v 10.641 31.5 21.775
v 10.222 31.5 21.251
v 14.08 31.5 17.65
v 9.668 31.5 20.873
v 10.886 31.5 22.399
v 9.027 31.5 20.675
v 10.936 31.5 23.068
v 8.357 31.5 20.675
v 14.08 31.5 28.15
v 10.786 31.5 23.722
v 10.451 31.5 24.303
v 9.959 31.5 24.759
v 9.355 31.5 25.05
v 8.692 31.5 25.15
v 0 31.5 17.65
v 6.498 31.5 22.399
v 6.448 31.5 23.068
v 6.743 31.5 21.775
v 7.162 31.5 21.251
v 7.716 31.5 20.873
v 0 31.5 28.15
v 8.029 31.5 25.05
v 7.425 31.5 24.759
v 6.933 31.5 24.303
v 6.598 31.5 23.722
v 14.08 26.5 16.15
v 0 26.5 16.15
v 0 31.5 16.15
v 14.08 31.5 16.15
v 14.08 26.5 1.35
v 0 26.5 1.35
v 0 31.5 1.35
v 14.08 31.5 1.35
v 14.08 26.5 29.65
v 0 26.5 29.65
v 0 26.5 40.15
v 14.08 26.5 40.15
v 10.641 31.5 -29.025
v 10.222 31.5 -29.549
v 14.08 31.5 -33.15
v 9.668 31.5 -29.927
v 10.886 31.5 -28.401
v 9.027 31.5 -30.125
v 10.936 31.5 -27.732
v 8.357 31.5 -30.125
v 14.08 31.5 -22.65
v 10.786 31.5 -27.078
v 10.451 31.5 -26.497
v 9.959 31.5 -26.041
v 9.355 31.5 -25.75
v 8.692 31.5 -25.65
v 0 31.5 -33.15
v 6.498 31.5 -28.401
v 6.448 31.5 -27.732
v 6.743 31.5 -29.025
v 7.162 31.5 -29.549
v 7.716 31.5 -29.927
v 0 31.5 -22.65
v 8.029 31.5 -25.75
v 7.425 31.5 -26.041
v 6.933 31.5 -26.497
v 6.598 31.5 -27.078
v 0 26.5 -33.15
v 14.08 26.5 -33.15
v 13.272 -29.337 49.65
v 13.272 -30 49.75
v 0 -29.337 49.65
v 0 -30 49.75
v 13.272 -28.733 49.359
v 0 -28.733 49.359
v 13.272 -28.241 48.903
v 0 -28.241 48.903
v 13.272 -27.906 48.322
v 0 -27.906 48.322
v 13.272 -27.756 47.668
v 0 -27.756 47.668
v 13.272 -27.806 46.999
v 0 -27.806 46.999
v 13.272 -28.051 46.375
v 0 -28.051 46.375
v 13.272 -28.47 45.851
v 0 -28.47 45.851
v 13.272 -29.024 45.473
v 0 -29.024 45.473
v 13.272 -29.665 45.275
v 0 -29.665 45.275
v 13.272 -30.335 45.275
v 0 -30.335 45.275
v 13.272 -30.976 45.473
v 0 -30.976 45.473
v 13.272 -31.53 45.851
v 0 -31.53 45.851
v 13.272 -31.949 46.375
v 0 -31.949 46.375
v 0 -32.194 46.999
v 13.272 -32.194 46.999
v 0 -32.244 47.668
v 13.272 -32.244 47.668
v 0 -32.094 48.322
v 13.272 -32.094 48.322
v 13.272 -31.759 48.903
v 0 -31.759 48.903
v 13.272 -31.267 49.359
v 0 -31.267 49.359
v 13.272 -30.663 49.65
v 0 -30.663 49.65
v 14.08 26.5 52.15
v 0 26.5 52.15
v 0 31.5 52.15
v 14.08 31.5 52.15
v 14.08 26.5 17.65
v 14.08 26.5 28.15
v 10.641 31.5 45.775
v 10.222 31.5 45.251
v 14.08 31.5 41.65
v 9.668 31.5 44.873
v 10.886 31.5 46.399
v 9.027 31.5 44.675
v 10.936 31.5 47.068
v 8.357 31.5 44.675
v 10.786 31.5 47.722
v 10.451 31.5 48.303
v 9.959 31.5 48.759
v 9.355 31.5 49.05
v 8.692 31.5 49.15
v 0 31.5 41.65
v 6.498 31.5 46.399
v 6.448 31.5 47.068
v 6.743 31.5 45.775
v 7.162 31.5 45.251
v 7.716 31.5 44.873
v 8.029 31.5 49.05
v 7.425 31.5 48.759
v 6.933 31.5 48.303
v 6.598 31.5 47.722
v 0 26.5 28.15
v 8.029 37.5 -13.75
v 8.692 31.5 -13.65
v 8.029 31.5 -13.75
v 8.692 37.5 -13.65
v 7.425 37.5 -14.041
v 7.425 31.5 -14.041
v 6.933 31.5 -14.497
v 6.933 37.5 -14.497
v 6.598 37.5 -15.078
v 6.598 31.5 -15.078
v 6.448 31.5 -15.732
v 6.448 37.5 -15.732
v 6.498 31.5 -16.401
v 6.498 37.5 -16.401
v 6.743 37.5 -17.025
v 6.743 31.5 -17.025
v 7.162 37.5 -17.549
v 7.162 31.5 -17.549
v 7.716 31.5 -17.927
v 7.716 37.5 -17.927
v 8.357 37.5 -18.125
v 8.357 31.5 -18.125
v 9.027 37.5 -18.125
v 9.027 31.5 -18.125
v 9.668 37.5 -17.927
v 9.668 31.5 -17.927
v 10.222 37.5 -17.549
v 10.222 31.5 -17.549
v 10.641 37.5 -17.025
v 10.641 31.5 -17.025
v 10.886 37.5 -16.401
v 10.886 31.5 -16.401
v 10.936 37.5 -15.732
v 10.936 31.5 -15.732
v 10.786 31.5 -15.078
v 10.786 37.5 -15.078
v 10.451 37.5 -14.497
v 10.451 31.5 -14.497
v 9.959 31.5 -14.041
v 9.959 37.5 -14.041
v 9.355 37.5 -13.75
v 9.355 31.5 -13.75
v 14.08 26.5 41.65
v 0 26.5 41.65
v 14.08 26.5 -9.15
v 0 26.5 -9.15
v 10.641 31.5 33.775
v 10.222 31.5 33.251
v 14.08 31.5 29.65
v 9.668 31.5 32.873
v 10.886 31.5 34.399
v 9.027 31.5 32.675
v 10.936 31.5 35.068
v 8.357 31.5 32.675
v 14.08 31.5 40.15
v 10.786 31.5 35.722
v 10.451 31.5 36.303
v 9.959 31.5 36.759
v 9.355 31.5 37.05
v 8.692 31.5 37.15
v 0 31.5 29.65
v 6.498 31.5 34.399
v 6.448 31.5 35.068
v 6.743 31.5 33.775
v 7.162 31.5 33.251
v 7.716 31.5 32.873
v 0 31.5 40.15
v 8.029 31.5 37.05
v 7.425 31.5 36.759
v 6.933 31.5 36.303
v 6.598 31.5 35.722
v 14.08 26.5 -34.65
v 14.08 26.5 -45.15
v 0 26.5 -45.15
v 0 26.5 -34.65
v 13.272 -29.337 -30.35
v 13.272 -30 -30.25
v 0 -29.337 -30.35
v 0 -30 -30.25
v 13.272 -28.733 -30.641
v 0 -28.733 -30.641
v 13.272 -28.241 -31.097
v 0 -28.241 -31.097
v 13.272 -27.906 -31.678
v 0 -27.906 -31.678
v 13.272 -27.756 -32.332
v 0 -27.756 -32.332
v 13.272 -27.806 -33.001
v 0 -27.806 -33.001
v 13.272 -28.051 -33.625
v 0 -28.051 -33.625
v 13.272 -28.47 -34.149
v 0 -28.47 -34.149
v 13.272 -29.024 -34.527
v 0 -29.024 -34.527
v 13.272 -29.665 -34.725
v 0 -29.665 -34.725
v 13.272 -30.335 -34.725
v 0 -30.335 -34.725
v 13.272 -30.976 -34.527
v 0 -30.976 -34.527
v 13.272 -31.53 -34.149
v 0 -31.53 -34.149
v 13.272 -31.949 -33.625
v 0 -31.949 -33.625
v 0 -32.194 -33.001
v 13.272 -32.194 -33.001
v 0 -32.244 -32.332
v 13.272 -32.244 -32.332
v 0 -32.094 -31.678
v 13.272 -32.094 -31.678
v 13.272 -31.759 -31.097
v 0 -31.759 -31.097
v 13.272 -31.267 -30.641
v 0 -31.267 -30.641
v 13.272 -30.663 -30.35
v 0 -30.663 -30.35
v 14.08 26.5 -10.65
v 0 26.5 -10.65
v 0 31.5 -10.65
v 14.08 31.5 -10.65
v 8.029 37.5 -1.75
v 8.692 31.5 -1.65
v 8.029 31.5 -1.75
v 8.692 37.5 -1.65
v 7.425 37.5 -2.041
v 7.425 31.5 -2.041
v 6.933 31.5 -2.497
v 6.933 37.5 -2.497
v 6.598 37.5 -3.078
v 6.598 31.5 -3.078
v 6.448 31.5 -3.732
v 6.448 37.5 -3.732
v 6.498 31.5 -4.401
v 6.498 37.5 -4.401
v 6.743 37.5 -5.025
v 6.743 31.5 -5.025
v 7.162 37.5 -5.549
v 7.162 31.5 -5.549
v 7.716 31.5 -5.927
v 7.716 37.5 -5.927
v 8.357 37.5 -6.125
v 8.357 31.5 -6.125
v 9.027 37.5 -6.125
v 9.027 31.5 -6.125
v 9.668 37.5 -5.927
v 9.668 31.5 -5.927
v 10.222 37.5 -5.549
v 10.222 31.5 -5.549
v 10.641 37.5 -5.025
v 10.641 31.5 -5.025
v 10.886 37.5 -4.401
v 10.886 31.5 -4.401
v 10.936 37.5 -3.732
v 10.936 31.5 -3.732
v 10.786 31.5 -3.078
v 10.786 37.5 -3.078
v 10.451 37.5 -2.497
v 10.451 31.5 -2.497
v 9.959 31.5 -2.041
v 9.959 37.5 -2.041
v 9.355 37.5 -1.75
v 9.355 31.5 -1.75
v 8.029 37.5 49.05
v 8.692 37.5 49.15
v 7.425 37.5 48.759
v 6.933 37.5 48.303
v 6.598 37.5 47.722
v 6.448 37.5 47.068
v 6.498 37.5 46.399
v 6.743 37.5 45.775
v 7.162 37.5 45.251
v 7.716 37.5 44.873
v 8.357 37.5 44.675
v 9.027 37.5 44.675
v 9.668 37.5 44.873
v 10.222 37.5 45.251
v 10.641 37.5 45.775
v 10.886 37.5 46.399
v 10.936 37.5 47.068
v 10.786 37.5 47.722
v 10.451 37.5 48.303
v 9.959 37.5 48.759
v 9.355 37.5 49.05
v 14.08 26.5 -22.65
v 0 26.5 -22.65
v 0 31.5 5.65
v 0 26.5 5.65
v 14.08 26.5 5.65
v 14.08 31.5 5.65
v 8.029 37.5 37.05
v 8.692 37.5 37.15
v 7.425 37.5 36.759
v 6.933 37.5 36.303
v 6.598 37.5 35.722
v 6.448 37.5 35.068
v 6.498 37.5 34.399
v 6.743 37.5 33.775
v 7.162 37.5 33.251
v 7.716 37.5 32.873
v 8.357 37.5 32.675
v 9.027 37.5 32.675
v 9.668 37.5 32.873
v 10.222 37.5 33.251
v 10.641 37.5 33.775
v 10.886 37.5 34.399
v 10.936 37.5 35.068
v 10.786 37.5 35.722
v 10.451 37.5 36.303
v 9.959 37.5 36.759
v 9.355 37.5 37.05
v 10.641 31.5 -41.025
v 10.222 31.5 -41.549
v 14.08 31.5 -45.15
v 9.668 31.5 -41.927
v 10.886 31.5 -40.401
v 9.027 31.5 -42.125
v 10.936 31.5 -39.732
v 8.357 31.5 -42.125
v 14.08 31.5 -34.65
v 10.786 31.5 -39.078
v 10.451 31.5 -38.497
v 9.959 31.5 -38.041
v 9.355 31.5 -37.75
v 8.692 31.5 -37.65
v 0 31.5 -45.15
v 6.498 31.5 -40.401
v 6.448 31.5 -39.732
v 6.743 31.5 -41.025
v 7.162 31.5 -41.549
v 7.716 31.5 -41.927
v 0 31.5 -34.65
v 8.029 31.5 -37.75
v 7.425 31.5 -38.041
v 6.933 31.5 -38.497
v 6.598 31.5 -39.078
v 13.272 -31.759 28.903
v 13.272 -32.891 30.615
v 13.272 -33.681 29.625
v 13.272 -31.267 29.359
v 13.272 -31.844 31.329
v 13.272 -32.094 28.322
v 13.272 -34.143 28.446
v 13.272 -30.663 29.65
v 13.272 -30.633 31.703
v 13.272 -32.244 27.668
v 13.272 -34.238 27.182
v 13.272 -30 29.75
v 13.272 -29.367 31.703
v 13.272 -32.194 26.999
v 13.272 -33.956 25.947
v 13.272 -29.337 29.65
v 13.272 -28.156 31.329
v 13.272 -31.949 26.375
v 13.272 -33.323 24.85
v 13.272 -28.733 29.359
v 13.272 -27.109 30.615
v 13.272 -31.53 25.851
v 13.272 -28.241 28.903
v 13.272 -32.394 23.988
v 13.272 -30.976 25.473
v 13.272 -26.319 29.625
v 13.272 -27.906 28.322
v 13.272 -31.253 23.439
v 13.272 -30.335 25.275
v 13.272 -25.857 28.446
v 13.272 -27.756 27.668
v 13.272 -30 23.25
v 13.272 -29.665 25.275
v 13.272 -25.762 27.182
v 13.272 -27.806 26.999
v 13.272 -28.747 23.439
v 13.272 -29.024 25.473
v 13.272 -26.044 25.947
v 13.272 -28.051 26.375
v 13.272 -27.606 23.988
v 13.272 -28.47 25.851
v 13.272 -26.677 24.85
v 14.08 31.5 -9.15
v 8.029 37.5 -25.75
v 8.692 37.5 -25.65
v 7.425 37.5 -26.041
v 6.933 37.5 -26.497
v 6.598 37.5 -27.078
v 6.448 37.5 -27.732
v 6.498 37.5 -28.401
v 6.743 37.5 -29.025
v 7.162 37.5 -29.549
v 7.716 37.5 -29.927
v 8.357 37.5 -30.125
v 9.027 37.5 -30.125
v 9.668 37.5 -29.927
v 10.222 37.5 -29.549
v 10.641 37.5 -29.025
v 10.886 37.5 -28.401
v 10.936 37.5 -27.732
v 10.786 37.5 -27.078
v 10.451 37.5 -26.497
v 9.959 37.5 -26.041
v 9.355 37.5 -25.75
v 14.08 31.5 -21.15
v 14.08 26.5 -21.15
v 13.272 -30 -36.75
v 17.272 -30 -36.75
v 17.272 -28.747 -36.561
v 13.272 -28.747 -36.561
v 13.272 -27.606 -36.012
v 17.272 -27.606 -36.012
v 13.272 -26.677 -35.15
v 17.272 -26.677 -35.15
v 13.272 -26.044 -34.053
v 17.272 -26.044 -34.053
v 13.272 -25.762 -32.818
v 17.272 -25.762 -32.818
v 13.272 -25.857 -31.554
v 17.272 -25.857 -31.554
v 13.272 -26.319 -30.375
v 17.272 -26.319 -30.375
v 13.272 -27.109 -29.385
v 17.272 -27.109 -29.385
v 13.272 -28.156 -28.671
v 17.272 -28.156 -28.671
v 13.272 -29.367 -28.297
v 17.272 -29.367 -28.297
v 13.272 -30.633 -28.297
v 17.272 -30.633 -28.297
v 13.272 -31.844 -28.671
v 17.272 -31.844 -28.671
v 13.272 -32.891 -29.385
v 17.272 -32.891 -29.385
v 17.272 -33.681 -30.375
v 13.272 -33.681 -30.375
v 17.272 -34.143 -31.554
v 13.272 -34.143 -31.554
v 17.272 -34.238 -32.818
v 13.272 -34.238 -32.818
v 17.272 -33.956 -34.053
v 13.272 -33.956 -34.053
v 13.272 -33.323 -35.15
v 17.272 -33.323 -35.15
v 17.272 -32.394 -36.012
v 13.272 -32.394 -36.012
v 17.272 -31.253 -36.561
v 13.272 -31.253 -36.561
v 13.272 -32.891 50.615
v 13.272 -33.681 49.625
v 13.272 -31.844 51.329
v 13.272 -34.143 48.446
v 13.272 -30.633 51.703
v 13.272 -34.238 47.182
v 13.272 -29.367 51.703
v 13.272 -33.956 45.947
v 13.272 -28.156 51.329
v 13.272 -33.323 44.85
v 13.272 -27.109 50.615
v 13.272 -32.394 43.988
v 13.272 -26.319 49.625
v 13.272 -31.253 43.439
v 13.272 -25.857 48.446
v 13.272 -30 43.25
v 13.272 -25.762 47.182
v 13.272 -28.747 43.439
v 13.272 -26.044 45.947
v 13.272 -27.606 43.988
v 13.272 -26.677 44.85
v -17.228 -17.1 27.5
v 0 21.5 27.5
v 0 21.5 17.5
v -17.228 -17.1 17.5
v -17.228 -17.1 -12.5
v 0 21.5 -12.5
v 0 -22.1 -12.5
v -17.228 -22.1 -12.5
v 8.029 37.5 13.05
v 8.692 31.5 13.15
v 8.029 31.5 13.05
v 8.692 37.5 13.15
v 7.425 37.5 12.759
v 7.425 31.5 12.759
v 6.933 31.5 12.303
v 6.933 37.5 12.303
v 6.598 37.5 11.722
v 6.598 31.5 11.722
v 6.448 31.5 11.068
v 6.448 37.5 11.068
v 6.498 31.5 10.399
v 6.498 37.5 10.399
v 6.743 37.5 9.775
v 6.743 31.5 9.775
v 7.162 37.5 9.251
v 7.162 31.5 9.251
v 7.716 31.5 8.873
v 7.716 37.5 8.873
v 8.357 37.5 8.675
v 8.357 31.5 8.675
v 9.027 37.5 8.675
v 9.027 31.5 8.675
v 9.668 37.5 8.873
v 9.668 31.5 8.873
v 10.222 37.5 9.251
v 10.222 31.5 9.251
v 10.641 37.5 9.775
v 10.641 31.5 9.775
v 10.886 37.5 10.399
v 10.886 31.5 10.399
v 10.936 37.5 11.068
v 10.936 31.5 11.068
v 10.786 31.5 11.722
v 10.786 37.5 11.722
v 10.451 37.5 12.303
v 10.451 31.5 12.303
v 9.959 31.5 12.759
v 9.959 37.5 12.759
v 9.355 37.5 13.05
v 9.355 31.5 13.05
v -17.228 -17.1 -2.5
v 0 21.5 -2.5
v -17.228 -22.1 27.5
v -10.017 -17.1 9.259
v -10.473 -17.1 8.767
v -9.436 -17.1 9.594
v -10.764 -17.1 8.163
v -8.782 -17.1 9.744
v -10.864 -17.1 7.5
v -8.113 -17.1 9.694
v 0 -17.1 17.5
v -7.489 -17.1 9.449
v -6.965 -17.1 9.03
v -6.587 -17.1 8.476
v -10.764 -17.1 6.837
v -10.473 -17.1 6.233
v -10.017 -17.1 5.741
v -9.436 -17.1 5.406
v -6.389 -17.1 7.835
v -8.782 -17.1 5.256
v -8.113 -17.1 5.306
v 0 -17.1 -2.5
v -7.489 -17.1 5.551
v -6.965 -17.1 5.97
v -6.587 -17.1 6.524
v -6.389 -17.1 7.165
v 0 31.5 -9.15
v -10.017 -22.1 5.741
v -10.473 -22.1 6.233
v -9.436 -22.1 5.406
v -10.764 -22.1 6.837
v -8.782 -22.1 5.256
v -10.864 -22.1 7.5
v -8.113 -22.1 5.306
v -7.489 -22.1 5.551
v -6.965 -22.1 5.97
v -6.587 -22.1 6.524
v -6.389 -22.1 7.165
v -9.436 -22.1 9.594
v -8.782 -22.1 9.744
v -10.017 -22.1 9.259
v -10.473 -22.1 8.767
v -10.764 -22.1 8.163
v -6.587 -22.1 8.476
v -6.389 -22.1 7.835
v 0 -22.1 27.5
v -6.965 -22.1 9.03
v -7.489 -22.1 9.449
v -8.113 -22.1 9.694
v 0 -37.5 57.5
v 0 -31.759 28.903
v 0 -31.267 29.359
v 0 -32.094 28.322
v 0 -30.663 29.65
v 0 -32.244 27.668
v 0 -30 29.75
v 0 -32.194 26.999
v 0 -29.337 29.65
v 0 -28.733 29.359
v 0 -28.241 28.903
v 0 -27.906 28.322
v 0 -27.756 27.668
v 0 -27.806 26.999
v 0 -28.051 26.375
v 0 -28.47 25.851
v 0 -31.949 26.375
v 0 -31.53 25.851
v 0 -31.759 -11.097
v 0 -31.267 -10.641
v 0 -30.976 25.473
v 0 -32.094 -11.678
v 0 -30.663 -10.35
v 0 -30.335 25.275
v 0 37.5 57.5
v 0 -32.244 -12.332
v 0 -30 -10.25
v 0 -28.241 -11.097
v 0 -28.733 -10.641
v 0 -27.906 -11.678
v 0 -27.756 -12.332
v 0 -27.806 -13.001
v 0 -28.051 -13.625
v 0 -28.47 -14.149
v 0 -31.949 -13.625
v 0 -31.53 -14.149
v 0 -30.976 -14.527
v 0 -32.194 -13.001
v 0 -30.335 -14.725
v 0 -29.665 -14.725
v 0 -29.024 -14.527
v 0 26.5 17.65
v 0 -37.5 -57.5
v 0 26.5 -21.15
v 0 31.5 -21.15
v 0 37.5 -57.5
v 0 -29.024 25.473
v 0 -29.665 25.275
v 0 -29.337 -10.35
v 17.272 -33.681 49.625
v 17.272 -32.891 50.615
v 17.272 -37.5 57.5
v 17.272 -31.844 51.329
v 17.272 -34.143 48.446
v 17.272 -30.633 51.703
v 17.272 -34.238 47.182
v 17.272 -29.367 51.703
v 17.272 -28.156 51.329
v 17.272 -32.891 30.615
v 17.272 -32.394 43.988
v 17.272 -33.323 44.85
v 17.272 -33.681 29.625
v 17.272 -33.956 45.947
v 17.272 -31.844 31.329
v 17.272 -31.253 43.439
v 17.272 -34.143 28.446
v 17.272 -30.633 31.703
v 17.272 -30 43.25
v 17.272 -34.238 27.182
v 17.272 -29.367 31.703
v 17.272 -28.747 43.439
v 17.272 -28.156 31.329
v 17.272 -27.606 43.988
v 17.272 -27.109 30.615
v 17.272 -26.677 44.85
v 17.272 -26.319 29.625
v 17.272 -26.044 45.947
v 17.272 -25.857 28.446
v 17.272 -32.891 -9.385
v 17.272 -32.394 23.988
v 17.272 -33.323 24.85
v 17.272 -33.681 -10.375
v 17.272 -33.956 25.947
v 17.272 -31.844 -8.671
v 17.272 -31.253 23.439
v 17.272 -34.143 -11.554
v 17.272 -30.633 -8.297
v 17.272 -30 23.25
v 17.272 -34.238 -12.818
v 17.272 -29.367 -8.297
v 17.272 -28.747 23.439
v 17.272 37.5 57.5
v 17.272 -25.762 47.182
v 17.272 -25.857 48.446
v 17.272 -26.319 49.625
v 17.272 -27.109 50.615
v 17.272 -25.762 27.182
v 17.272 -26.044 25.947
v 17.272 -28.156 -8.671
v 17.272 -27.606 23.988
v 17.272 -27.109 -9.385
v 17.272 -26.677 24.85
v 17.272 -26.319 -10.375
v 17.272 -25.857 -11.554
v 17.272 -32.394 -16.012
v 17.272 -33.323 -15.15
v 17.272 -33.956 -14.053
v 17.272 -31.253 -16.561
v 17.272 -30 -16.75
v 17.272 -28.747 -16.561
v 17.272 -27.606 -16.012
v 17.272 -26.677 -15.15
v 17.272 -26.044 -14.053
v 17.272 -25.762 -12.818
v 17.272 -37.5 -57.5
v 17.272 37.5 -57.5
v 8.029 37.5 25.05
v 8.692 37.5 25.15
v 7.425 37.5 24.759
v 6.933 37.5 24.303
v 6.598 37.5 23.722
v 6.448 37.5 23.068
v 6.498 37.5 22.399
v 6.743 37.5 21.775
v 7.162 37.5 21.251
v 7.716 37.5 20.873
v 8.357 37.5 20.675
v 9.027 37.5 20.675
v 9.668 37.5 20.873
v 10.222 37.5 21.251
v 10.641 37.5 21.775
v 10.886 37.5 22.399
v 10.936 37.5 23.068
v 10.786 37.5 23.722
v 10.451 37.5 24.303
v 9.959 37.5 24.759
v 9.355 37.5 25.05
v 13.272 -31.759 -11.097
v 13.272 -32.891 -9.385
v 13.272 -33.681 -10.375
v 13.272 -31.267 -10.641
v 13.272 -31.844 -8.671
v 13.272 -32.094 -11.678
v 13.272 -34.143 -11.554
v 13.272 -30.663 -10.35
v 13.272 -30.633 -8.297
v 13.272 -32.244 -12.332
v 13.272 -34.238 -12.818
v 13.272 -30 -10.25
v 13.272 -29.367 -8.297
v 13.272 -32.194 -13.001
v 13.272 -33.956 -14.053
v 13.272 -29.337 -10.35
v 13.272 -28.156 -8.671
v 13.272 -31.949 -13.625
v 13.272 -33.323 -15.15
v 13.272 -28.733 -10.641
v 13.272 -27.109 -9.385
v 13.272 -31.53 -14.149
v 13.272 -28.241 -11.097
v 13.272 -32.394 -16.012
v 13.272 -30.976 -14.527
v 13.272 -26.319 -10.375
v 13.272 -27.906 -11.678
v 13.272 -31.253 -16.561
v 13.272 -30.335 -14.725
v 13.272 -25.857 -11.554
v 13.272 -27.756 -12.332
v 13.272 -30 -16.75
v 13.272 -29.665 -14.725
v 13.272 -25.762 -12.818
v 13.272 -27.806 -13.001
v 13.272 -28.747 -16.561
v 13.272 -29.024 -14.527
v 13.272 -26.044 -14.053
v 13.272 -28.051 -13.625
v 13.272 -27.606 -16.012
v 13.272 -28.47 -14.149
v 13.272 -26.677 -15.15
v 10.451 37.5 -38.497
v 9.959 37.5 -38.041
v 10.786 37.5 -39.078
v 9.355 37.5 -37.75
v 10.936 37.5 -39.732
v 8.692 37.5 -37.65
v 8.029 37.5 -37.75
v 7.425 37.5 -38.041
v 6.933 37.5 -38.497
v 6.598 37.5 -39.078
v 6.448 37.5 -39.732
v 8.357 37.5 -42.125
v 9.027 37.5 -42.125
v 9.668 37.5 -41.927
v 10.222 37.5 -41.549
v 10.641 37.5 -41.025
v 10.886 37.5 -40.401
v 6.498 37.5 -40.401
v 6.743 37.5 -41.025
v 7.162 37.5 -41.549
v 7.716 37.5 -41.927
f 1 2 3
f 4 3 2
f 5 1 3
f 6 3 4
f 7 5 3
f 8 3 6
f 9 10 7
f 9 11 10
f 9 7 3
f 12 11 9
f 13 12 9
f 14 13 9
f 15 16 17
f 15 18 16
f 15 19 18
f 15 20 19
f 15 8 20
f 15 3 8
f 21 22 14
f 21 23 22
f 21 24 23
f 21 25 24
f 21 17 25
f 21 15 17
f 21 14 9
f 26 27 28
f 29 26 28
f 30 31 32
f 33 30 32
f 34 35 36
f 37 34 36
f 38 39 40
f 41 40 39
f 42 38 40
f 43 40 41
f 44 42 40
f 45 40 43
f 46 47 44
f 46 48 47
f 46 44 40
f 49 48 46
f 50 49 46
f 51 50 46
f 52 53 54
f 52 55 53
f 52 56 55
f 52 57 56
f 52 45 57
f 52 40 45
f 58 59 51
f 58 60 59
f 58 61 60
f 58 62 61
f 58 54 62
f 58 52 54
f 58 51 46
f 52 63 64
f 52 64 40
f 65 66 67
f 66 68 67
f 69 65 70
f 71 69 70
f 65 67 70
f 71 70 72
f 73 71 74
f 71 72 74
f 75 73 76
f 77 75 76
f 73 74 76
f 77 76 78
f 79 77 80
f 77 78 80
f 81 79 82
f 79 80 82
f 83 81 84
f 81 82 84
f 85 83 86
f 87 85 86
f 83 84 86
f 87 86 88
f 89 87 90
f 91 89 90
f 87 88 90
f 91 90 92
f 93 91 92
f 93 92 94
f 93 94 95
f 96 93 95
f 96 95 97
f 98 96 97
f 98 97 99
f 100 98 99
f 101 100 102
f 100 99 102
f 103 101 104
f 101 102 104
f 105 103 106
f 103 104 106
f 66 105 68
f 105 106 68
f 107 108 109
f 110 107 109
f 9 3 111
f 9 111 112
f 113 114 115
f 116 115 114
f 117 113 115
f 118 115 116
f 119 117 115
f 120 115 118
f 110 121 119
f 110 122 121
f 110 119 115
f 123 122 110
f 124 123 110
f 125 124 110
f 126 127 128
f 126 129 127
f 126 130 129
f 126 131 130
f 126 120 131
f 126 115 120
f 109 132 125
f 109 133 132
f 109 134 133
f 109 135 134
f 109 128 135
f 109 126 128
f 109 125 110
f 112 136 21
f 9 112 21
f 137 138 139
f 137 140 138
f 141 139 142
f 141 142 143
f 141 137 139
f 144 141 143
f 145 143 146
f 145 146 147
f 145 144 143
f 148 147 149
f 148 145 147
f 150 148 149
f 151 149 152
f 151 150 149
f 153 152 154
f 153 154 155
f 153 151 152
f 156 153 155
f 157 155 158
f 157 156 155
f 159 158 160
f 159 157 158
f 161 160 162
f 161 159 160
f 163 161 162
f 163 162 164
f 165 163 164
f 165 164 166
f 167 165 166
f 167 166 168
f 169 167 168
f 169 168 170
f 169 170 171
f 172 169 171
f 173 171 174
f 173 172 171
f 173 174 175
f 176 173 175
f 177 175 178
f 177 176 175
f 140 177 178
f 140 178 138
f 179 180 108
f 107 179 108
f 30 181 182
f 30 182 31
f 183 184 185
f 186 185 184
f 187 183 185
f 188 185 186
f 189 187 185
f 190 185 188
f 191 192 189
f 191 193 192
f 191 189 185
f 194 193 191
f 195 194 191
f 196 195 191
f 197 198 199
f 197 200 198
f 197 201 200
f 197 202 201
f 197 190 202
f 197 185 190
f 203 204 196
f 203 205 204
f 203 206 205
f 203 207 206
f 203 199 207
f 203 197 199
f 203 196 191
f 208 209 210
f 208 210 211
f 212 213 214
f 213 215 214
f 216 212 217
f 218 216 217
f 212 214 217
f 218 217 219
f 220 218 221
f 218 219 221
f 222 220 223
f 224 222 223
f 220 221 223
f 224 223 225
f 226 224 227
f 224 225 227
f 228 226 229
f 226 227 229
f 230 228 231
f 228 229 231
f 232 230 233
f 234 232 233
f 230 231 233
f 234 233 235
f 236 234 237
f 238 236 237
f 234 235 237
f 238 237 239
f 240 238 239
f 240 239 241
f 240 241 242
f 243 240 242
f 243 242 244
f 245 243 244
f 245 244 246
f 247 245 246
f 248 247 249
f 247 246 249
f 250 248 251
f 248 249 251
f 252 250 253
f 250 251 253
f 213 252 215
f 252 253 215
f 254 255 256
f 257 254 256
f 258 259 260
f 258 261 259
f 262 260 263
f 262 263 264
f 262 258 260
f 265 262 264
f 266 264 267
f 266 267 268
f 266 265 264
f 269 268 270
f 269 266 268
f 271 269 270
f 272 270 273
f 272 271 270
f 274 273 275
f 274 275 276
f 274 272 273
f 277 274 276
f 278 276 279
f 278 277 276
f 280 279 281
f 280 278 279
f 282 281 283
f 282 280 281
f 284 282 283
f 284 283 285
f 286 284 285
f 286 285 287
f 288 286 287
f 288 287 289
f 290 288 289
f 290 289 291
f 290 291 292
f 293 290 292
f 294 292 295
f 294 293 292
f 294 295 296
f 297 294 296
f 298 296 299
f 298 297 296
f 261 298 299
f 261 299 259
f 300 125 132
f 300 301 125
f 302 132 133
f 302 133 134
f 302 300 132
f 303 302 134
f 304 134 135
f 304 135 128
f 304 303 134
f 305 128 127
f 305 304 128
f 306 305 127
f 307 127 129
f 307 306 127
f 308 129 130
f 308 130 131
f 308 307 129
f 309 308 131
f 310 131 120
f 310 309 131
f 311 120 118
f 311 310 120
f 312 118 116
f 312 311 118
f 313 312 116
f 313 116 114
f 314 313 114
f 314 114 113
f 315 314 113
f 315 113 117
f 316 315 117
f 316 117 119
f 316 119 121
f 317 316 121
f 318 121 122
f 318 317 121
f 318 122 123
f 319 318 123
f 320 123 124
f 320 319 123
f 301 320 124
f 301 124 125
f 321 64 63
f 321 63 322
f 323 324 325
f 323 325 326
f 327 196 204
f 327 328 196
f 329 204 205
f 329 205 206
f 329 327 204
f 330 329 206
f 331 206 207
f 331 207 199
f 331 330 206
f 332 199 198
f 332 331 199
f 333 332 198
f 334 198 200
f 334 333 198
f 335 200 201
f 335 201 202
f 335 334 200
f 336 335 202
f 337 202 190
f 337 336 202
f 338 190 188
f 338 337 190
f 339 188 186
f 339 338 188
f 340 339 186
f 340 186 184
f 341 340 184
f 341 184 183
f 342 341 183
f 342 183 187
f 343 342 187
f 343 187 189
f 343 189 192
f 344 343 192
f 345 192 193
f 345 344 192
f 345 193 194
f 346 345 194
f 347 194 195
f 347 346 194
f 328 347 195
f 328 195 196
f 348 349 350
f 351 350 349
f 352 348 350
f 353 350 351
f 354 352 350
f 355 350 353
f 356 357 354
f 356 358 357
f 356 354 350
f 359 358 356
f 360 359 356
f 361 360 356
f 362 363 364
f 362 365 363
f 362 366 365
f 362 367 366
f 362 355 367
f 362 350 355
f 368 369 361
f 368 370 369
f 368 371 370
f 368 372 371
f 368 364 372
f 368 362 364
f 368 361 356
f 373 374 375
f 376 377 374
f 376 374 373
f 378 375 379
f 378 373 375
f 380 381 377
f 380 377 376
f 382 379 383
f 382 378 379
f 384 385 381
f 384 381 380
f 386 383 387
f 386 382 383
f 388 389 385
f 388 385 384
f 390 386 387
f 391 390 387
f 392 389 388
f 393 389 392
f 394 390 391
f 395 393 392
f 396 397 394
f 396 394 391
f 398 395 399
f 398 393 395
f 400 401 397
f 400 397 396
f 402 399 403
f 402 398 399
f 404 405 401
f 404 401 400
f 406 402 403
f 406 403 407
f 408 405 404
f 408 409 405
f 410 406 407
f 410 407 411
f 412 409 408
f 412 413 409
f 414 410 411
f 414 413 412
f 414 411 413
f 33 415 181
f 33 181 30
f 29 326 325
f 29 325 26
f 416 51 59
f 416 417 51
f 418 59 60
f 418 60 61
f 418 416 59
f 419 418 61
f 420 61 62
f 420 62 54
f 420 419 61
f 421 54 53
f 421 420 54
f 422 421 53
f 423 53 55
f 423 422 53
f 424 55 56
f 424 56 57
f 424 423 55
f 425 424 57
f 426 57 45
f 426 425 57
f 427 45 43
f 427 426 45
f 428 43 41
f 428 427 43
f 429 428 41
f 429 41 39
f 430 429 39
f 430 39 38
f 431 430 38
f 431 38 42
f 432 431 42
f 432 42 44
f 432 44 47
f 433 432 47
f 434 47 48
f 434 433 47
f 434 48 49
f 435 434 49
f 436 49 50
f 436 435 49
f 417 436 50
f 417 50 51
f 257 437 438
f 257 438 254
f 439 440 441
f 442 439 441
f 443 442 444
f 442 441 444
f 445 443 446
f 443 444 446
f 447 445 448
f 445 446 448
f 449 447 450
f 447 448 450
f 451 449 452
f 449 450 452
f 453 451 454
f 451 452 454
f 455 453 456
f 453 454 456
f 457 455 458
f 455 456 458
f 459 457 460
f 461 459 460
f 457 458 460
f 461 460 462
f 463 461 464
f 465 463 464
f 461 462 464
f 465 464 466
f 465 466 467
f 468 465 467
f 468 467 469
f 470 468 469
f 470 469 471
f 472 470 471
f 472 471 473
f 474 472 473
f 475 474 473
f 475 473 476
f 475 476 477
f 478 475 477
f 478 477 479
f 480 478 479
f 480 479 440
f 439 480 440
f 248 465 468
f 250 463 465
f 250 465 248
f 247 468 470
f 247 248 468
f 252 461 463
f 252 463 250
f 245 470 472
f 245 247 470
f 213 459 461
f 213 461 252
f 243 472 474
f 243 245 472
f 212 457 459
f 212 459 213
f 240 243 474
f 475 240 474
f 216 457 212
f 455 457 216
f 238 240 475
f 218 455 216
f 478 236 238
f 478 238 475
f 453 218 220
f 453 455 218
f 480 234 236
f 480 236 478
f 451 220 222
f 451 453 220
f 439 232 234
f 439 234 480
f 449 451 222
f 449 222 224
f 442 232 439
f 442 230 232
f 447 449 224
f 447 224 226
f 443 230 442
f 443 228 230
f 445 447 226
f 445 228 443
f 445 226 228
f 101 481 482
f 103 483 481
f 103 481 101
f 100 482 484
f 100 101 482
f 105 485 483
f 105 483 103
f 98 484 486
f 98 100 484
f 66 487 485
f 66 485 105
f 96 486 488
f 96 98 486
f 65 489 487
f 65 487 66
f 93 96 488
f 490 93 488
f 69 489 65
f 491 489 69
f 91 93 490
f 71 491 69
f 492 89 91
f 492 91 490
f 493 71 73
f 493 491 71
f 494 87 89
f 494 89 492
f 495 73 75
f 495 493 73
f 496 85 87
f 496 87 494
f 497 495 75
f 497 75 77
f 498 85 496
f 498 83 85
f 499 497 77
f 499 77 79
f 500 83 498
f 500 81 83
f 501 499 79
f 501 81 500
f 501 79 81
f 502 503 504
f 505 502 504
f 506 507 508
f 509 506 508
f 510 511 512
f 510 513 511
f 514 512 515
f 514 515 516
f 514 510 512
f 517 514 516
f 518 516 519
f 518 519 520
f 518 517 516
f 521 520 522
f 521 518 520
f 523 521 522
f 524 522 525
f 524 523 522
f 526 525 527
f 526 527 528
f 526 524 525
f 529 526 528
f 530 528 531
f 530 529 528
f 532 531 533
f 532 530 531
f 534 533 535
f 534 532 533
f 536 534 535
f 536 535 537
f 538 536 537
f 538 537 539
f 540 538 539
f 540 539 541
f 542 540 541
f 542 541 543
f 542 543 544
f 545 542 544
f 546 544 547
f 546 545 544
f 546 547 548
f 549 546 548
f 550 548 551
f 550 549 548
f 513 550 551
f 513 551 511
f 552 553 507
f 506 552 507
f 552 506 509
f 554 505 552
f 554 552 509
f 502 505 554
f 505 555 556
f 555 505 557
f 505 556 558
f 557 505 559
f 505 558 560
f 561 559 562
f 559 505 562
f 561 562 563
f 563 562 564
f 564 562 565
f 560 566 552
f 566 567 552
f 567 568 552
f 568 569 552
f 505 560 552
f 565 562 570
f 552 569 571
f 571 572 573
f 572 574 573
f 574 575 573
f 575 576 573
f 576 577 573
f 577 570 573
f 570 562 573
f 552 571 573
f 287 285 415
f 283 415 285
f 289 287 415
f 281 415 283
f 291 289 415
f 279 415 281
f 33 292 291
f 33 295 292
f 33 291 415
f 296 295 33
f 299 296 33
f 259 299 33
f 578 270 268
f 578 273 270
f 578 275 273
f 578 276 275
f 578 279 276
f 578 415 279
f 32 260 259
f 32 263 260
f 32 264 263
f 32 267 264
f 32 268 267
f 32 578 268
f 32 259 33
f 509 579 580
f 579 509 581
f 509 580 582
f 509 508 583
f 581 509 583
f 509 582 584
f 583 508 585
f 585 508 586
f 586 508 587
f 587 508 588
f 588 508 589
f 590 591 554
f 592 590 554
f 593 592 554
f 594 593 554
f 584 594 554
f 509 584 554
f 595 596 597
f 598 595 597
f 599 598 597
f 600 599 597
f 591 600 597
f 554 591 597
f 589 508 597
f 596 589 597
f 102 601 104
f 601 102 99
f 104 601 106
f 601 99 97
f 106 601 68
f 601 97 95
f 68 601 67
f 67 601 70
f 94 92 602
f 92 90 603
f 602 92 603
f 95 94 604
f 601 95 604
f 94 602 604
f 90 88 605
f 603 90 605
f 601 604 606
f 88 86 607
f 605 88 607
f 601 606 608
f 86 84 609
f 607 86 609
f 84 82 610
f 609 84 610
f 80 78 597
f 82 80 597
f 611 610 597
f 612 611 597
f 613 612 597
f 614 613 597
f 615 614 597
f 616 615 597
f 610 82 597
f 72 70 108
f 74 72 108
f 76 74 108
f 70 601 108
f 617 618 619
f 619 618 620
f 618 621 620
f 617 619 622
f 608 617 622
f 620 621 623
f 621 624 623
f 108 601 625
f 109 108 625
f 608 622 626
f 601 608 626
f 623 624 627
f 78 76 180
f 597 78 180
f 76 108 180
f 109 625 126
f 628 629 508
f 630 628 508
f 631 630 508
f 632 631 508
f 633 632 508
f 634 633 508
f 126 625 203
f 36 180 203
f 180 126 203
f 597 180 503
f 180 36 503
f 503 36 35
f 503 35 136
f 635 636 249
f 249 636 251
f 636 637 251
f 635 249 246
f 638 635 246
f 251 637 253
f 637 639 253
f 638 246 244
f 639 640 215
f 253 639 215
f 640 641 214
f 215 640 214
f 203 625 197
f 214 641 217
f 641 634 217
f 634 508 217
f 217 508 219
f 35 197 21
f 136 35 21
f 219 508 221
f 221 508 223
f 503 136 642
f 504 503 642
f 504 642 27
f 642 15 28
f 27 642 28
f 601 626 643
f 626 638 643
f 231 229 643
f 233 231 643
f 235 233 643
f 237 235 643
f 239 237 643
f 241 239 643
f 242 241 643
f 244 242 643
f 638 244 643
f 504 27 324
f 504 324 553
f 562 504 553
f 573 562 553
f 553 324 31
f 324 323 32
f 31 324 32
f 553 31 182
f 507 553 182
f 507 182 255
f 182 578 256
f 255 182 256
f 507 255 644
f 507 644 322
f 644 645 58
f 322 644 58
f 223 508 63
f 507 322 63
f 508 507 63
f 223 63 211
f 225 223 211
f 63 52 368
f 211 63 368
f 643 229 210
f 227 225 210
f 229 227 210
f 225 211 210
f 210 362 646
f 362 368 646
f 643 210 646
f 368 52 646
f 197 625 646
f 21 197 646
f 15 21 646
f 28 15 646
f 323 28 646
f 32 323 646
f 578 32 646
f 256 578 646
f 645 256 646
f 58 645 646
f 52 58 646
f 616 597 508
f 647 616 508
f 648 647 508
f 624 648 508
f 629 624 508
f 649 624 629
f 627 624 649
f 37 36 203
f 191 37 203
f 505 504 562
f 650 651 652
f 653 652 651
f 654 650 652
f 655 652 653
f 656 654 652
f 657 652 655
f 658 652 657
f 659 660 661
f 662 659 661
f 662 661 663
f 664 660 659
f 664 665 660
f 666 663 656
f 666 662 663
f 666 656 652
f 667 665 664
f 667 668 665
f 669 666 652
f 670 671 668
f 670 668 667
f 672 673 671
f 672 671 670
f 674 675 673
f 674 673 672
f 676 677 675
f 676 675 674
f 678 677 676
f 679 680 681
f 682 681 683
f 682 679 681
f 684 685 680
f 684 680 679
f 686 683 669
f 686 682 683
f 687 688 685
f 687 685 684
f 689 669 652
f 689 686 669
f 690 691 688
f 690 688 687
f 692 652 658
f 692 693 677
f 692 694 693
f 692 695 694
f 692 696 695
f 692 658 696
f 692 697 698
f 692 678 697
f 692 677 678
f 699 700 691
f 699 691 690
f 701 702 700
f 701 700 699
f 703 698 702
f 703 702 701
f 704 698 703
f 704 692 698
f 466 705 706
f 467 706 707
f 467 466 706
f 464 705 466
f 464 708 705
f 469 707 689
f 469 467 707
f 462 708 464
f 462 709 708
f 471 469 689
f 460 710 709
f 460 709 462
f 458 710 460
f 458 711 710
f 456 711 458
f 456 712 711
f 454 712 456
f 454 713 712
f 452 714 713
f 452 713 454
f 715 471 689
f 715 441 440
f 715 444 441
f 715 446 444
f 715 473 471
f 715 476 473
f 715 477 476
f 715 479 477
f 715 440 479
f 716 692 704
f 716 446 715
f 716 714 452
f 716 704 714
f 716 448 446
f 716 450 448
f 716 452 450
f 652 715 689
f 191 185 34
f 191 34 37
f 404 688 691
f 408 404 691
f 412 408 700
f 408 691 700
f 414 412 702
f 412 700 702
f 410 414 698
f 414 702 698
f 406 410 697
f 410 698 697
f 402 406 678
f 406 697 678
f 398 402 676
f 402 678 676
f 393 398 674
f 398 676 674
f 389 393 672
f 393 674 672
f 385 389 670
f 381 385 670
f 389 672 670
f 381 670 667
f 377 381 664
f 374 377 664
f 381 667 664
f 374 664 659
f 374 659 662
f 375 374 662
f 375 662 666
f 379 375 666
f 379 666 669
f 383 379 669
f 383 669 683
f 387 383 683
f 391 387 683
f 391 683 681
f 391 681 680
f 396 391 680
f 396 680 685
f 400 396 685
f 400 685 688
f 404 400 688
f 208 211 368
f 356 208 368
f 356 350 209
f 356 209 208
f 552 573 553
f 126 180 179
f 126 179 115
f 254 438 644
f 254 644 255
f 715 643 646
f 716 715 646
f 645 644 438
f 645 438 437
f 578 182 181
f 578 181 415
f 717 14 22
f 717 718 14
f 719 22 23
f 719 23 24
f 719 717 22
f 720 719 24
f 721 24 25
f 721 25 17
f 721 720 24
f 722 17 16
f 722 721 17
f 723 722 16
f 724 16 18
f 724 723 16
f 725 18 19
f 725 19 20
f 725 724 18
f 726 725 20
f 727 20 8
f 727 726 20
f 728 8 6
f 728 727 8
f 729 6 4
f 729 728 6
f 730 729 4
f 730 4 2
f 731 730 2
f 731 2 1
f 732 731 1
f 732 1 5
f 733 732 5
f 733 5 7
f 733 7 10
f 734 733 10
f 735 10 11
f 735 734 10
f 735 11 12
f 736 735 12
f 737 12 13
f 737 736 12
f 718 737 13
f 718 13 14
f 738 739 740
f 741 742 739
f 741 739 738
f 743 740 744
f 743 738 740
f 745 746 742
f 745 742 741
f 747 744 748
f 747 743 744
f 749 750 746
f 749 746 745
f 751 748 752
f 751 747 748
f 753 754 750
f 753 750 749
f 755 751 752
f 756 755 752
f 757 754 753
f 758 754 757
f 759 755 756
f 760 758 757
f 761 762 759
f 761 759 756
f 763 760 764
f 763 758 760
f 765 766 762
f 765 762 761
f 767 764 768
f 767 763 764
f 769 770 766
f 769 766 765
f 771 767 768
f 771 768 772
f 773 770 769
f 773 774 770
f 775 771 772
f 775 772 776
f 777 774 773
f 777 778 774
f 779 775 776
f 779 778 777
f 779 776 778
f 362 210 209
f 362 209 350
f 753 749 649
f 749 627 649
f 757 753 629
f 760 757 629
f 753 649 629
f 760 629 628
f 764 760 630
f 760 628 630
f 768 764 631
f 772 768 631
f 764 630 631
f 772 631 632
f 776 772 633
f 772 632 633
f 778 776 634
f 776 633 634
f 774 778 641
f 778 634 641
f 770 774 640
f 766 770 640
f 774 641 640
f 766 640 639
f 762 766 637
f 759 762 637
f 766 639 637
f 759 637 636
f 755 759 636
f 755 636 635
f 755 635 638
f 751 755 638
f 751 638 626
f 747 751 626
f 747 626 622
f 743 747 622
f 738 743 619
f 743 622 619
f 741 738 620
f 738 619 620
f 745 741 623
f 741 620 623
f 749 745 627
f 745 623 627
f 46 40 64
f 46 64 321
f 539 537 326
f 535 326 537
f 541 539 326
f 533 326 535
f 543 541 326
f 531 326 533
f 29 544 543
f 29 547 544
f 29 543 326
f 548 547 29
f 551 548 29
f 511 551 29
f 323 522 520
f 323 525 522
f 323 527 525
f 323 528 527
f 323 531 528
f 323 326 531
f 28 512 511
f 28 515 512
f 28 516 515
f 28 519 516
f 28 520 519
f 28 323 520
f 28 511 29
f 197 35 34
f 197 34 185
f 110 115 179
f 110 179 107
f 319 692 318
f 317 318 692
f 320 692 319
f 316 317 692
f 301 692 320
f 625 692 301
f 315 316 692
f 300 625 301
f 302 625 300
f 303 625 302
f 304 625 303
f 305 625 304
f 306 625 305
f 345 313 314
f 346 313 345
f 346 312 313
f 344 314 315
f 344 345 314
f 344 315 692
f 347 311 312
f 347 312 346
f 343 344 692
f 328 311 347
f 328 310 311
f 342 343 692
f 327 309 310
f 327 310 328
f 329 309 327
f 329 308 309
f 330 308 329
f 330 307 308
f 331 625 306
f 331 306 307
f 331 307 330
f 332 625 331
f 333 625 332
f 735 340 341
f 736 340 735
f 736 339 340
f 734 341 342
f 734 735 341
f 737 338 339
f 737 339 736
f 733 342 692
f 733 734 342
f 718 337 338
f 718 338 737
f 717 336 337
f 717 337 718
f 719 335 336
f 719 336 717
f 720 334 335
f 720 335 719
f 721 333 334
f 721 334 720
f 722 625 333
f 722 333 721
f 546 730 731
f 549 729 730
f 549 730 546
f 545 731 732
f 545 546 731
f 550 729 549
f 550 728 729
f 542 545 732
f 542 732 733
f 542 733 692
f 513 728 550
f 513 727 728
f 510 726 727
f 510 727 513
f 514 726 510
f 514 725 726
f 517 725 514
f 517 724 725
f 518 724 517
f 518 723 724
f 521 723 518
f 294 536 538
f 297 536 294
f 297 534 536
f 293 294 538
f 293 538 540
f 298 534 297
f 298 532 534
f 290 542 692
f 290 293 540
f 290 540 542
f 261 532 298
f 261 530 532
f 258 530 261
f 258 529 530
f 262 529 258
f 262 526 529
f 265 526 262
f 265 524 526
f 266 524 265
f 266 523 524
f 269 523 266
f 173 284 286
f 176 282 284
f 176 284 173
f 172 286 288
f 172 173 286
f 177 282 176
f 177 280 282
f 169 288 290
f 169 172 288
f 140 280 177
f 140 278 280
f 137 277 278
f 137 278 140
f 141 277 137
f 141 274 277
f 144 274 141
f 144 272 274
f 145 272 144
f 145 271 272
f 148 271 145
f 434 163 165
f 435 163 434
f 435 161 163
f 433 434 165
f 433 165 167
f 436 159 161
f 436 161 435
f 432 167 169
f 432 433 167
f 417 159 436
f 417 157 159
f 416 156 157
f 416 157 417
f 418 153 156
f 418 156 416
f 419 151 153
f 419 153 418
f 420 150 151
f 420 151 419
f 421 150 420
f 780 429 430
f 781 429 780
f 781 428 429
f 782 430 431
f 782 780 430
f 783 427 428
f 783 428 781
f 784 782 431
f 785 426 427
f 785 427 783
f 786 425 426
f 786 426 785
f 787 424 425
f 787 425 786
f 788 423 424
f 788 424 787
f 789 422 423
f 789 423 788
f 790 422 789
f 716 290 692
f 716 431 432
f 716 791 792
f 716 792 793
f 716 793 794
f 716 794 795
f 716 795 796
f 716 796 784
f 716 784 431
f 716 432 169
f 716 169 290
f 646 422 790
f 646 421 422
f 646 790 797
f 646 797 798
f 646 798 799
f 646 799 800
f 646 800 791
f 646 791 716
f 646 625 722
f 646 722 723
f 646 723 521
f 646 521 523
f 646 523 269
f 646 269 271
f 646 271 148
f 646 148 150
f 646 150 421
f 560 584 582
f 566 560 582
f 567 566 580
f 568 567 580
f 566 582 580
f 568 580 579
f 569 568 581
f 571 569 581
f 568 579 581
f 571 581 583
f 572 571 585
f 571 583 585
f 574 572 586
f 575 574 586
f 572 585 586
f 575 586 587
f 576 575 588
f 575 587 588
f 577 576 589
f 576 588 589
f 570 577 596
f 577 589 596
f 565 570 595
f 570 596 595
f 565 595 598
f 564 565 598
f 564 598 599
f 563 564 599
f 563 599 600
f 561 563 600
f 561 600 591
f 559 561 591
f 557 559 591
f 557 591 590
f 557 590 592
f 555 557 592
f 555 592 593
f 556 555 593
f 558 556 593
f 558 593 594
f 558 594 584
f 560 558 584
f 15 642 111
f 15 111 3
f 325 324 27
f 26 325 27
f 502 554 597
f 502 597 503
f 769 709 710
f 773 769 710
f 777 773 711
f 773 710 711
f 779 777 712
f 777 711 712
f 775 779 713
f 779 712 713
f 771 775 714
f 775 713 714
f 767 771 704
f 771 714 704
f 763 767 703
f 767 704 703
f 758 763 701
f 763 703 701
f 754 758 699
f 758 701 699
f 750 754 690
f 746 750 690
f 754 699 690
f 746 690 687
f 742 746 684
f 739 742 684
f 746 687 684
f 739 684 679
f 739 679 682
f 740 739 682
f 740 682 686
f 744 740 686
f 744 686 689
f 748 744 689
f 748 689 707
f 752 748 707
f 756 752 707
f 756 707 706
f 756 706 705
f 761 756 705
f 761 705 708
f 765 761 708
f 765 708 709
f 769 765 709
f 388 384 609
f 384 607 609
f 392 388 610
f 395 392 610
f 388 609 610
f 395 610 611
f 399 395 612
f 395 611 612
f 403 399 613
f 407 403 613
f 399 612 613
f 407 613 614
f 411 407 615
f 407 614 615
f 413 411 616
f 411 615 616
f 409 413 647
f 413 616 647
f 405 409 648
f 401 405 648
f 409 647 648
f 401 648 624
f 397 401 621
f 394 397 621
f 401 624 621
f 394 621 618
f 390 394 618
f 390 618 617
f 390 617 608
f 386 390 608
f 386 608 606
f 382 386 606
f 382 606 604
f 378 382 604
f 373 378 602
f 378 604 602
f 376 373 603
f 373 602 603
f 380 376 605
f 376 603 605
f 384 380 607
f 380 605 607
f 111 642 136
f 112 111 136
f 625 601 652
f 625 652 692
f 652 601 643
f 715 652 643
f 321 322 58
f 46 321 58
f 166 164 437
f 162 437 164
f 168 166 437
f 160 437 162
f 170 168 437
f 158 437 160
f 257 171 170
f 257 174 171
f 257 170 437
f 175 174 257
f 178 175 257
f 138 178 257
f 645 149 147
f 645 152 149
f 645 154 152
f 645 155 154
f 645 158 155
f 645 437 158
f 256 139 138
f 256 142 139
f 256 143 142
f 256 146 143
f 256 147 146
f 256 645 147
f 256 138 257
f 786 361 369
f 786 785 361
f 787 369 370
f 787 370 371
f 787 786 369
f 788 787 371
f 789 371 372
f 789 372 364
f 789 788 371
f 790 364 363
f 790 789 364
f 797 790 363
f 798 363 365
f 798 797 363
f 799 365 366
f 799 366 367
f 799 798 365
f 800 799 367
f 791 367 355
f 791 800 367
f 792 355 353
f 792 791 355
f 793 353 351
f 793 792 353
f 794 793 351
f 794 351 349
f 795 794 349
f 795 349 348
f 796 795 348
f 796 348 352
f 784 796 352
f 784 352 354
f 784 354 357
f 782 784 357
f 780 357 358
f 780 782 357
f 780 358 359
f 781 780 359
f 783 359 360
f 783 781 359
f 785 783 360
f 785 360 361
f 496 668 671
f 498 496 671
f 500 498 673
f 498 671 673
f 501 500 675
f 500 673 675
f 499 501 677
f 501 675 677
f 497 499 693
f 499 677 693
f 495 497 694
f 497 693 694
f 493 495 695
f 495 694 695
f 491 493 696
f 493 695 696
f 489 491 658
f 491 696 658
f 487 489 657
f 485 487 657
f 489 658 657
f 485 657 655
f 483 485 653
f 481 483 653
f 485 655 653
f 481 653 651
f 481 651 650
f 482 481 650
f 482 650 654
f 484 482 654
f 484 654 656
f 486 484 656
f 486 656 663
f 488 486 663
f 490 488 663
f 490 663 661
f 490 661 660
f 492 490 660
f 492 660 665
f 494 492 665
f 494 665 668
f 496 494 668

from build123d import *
from OCP.BRepFilletAPI import BRepFilletAPI_MakeChamfer

# Parameters (mm, degrees)
SKETCH1_W                               = 115
SKETCH1_H                               = 75
BOSS_EXTRUDE1_DEPTH                     = 17.272
M4_CLEARANCE_HOLE1_AT_2_COUNT           = 2
M4_CLEARANCE_HOLE1_AT_2_PITCH           = 50.8
SKETCH5_W                               = 10.5
SKETCH5_H                               = 5
CUT_EXTRUDE1_DEPTH                      = 14.08
LPATTERN1_COUNT                         = 2
LPATTERN1_PITCH                         = 12
LPATTERN1_COL_COUNT                     = 3
LPATTERN1_COL_PITCH                     = 12
CBORE_FOR_M5_HEX_HEAD_BOLT1_D           = 4.5
CBORE_FOR_M5_HEX_HEAD_BOLT1_CBORE_D     = 8.5
CBORE_FOR_M5_HEX_HEAD_BOLT1_CBORE_DEPTH = 4
BOSS_EXTRUDE3_DEPTH                     = 17.228
CHAMFER2_SIZE                           = 17.228
CHAMFER2_SIZE_2                         = 38.6
M4_CLEARANCE_HOLE3_D                    = 4.5


with BuildPart() as part:
    # Sketch1 → Boss-Extrude1 (new body)
    with BuildSketch(Plane(origin=(0, 0, 0), x_dir=(0, 0, -1), z_dir=(1, 0, 0))):
        Rectangle(SKETCH1_W, SKETCH1_H)
    extrude(amount=BOSS_EXTRUDE1_DEPTH)

    # Sketch4 → M4 Clearance Hole1 (revolve, cut)
    with BuildSketch(Plane(origin=(8.692, 37.5, 22.9), x_dir=(0, 0, 1), z_dir=(1, 0, 0))):
        Polygon((0, 0), (0, 7.351936393), (2.25, 6), (2.25, 0), align=None)
    m4_clearance_hole1 = revolve(axis=Axis((8.692, 43.85, 22.9), (0, -1, 0)), mode=Mode.SUBTRACT)

    # M4 Clearance Hole1 at 2: M4 Clearance Hole1 ×2
    with Locations(*[(0, 0, -i * M4_CLEARANCE_HOLE1_AT_2_PITCH) for i in range(1, M4_CLEARANCE_HOLE1_AT_2_COUNT)]):
        add(m4_clearance_hole1, mode=Mode.SUBTRACT)

    # Sketch5 → Cut-Extrude1 (cut)
    with BuildSketch(Plane.ZY):
        with Locations((-27.9, 29)):
            Rectangle(SKETCH5_W, SKETCH5_H)
        with Locations((22.9, 29)):
            Rectangle(SKETCH5_W, SKETCH5_H)
    cut_extrude1 = extrude(amount=-CUT_EXTRUDE1_DEPTH, mode=Mode.SUBTRACT)

    # LPattern1: M4 Clearance Hole1, Cut-Extrude1 ×2
    with Locations(*[(0, 0, -i * LPATTERN1_PITCH) for i in range(1, LPATTERN1_COUNT)]):
        add(m4_clearance_hole1, mode=Mode.SUBTRACT)
        add(cut_extrude1, mode=Mode.SUBTRACT)

    # LPattern1 copy 1 sketch → LPattern1 copy 1 (revolve, cut)
    with BuildSketch(Plane(origin=(8.692, 37.5, -39.9), x_dir=(0, 0, 1), z_dir=(1, 0, 0))):
        Polygon((0, 0), (0, 7.351936393), (2.25, 6), (2.25, 0), align=None)
    revolve(axis=Axis((8.692, 43.85, -39.9), (0, -1, 0)), mode=Mode.SUBTRACT)

    # LPattern1 col: M4 Clearance Hole1, Cut-Extrude1 ×3
    with Locations(*[(0, 0, i * LPATTERN1_COL_PITCH) for i in range(1, LPATTERN1_COL_COUNT)]):
        add(m4_clearance_hole1, mode=Mode.SUBTRACT)
        add(cut_extrude1, mode=Mode.SUBTRACT)

    # LPattern1 col copy 1 sketch → LPattern1 col copy 1 (revolve, cut)
    with BuildSketch(Plane(origin=(8.692, 37.5, -15.9), x_dir=(0, 0, 1), z_dir=(1, 0, 0))):
        Polygon((0, 0), (0, 7.351936393), (2.25, 6), (2.25, 0), align=None)
    revolve(axis=Axis((8.692, 43.85, -15.9), (0, -1, 0)), mode=Mode.SUBTRACT)

    # LPattern1 col copy 2 sketch → LPattern1 col copy 2 (revolve, cut)
    with BuildSketch(Plane(origin=(8.692, 37.5, -3.9), x_dir=(0, 0, 1), z_dir=(1, 0, 0))):
        Polygon((0, 0), (0, 7.351936393), (2.25, 6), (2.25, 0), align=None)
    revolve(axis=Axis((8.692, 43.85, -3.9), (0, -1, 0)), mode=Mode.SUBTRACT)

    # CBORE for M5 Hex Head Bolt1 (through all)
    with Locations(Plane(origin=(17.272, 0, 0), x_dir=(0, 0, -1), z_dir=(1, 0, 0))):
        with Locations((32.5, -30), (12.5, -30), (-27.5, -30), (-47.5, -30)):
            CounterBoreHole(CBORE_FOR_M5_HEX_HEAD_BOLT1_D / 2, CBORE_FOR_M5_HEX_HEAD_BOLT1_CBORE_D / 2, CBORE_FOR_M5_HEX_HEAD_BOLT1_CBORE_DEPTH)

    # Sketch12 → Boss-Extrude3 (add)
    with BuildSketch(Plane.ZY):
        Polygon((-12.5, 21.5), (-12.5, -22.1), (27.5, -22.1), (27.5, 21.5), (17.5, 21.5), (17.5, -17.1), (-2.5, -17.1), (-2.5, 21.5), align=None)
    extrude(amount=BOSS_EXTRUDE3_DEPTH)

    # Chamfer2
    chamfer2_edges_1 = [part.edges().sort_by_distance(p)[0] for p in [
        (-17.228, 21.5, -7.5),
    ]]
    chamfer2_side_1 = [part.faces().sort_by_distance(p)[0] for p in [
        (-16.88344, 21.5, -7.5),
    ]]
    chamfer2_edges_2 = [part.edges().sort_by_distance(p)[0] for p in [
        (-17.228, 21.5, 22.5),
    ]]
    chamfer2_side_2 = [part.faces().sort_by_distance(p)[0] for p in [
        (-16.88344, 21.5, 22.5),
    ]]
    chamfer2 = BRepFilletAPI_MakeChamfer(part.part.solid().wrapped)
    for e in chamfer2_edges_1:
        chamfer2.Add(CHAMFER2_SIZE - 0.0001, CHAMFER2_SIZE_2 - 0.0001, e.wrapped, chamfer2_side_1[0].wrapped)
    for e in chamfer2_edges_2:
        chamfer2.Add(CHAMFER2_SIZE - 0.0001, CHAMFER2_SIZE_2 - 0.0001, e.wrapped, chamfer2_side_2[0].wrapped)
    add(Compound.cast(chamfer2.Shape()), mode=Mode.REPLACE)  # a hair under: the kernel refuses the full size

    # M4 Clearance Hole3 (through all)
    with Locations(Plane(origin=(0, -17.1, 0), x_dir=(1, 0, 0), z_dir=(0, 1, 0))):
        with Locations((-8.614, -7.5)):
            Hole(M4_CLEARANCE_HOLE3_D / 2)


solid = part.part
